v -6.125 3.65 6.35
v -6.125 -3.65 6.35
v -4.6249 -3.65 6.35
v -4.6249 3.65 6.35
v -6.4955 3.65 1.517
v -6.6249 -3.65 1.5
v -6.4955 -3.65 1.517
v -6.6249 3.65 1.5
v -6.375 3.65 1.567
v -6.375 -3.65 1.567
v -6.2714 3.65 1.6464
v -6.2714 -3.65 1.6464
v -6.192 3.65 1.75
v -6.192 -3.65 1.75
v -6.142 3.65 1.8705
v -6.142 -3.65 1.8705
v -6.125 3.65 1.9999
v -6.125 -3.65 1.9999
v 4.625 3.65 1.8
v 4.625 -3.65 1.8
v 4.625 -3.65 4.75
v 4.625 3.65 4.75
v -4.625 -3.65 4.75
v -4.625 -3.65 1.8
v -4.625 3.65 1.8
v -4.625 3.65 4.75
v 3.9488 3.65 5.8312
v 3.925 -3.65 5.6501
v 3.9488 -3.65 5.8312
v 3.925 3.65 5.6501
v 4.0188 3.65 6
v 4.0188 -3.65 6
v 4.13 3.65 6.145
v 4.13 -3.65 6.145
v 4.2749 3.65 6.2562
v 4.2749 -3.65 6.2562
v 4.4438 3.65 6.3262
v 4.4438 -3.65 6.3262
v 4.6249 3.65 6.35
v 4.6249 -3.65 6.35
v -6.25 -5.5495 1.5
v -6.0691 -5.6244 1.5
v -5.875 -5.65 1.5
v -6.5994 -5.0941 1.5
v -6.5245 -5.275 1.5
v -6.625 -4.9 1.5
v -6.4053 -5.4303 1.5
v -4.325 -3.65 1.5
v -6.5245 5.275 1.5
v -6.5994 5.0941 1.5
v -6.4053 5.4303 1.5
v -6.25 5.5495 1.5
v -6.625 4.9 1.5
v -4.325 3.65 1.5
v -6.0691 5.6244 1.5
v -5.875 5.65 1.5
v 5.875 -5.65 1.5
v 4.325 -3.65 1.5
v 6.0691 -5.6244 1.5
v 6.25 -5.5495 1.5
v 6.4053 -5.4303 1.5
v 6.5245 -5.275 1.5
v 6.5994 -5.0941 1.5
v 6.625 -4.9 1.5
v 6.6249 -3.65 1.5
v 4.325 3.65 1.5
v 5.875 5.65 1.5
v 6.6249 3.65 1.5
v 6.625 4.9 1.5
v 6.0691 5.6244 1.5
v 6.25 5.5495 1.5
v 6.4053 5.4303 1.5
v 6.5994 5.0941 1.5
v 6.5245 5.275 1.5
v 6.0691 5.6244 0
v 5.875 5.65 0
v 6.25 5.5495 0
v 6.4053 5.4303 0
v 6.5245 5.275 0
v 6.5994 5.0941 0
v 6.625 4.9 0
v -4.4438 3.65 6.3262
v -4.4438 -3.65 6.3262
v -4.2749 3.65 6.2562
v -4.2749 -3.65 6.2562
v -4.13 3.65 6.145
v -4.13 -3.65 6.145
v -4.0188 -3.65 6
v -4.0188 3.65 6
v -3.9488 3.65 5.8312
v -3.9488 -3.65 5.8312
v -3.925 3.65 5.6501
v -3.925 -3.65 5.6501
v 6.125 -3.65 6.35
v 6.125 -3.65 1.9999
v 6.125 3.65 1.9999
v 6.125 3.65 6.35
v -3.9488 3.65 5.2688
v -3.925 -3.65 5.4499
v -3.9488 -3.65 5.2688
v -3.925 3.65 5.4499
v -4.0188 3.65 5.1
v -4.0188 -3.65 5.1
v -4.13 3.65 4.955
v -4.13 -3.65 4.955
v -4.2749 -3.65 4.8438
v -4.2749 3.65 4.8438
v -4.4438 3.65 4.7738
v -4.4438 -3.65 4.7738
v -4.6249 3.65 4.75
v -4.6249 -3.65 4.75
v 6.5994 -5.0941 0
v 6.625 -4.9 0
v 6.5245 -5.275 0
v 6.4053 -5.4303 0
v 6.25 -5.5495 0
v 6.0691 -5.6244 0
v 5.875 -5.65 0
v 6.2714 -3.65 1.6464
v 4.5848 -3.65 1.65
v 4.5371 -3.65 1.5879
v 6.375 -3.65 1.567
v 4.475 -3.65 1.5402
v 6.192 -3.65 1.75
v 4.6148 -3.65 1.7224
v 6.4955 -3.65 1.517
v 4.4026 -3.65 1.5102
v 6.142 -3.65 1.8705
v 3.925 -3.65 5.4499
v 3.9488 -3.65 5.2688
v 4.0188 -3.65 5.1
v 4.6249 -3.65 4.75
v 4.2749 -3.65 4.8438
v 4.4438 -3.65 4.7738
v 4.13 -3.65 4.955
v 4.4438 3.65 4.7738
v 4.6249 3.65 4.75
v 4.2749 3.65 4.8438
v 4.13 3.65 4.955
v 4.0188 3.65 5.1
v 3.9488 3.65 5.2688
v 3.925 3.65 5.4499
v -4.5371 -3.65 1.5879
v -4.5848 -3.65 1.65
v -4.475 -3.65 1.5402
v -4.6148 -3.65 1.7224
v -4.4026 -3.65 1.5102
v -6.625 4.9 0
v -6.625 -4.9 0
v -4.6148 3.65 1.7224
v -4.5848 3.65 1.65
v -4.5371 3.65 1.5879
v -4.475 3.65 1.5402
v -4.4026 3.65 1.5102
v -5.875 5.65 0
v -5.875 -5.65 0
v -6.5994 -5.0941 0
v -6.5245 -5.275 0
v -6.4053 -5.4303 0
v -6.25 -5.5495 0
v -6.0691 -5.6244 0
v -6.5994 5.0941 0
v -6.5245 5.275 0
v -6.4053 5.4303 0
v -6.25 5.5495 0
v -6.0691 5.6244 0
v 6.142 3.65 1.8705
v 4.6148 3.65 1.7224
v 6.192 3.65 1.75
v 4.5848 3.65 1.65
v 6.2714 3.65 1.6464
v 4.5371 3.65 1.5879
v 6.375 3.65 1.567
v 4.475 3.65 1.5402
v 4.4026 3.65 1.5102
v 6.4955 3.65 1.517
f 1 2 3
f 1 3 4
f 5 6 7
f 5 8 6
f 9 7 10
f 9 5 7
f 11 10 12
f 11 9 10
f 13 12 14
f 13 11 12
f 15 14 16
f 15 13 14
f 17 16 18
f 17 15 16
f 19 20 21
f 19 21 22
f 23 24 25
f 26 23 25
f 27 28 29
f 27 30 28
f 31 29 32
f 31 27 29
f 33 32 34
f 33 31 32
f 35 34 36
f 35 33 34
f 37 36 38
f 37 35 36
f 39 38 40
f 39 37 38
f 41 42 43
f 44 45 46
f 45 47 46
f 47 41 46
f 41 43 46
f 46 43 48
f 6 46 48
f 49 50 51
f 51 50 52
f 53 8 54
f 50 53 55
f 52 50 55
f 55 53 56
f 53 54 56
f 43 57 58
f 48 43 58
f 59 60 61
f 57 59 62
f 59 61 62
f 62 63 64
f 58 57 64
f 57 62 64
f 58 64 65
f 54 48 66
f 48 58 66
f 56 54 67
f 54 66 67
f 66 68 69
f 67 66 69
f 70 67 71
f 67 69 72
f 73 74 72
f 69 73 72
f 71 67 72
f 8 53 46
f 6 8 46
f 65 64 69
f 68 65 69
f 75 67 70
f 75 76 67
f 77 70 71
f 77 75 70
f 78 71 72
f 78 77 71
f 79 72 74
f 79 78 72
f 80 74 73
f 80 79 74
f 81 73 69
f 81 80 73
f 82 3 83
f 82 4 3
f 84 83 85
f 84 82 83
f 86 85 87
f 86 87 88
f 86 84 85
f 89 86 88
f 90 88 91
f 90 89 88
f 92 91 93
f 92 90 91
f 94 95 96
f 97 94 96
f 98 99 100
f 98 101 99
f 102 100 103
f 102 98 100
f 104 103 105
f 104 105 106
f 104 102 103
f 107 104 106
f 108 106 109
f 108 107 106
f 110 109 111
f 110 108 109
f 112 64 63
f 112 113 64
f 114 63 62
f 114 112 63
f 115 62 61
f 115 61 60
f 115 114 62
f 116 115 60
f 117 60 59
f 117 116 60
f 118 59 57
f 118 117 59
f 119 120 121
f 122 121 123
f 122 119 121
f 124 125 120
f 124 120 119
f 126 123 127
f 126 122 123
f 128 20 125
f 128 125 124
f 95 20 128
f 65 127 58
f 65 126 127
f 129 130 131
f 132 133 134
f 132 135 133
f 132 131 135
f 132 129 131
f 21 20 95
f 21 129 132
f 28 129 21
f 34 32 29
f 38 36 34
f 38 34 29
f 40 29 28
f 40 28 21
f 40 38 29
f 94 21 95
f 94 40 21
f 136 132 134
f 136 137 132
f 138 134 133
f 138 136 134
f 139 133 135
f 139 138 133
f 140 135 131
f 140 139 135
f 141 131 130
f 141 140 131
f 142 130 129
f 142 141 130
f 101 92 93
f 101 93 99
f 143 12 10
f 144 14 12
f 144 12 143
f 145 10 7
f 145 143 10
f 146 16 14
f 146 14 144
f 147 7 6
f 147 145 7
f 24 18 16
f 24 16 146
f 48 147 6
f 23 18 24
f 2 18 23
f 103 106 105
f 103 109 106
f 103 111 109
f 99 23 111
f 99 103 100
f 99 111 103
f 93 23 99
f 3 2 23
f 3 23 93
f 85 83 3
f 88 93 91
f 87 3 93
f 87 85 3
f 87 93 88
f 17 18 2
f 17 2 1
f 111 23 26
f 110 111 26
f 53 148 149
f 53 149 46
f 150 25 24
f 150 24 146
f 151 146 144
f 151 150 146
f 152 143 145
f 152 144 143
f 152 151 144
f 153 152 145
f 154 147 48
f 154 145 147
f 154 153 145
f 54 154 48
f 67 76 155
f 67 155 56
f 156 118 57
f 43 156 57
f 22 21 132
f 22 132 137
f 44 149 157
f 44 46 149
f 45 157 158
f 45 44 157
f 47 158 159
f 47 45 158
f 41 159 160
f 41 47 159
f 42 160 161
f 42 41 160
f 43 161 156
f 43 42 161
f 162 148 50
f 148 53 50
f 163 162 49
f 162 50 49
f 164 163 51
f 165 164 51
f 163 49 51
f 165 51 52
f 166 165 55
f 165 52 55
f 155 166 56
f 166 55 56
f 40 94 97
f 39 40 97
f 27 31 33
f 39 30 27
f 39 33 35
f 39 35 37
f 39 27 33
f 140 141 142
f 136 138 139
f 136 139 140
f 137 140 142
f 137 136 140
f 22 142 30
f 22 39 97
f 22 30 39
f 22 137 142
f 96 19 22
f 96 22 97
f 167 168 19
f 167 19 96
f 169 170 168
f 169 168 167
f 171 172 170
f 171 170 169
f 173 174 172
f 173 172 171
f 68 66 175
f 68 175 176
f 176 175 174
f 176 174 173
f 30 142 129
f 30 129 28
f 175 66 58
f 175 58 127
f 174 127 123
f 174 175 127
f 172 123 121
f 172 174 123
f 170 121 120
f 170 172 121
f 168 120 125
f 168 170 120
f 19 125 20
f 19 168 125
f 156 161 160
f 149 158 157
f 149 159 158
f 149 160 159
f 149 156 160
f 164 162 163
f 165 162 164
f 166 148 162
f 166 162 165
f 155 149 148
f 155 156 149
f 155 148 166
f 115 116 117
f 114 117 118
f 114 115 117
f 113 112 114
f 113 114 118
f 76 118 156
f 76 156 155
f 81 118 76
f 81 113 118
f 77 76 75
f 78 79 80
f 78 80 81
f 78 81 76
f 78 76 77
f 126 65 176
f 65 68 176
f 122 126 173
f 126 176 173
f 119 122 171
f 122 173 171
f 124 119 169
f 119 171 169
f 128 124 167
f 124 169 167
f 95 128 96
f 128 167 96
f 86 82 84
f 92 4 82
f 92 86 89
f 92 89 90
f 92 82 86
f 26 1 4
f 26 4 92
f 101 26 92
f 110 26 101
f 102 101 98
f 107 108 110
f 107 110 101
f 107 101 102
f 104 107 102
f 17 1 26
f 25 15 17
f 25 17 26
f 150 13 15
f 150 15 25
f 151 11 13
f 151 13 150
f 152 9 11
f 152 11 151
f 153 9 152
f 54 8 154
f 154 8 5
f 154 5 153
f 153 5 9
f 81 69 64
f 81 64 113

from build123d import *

# Parameters (mm, degrees)
SKETCH_1_W          = 12.25
SKETCH_1_H          = 11.3
EXTRUDE_1_DEPTH     = 2.5
SKETCH_2_W          = 1.5
SKETCH_2_H          = 11.3
EXTRUDE_2_DEPTH     = 3.85
SKETCH_5_W          = 9.25
SKETCH_5_H          = 11.5
CUT_EXTRUDE_1_DEPTH = 1
SKETCH_8_W          = 1.6
SKETCH_8_H          = 11.3
EXTRUDE_5_DEPTH     = 0.7
SKETCH_9_W          = 1.6
SKETCH_9_H          = 11.3
EXTRUDE_6_DEPTH     = 0.7
FILLET_8_R          = 0.3
SKETCH_11_W         = 12.25
SKETCH_11_H         = 4.85
CUT_EXTRUDE_2_DEPTH = 2
SKETCH_12_W         = 12.25
SKETCH_12_H         = 4.85
CUT_EXTRUDE_3_DEPTH = 2
SKETCH_13_W         = 1.5
SKETCH_13_H         = 11.3
EXTRUDE_7_DEPTH     = 0.5
SKETCH_14_W         = 1.5
SKETCH_14_H         = 11.3
EXTRUDE_8_DEPTH     = 0.5
FILLET_9_R          = 0.5
FILLET_10_R         = 0.7
FILLET_11_R         = 0.75


with BuildPart() as part:
    # 스케치1 → 보스-돌출1 (new body)
    with BuildSketch(Plane.XY):
        Rectangle(SKETCH_1_W, SKETCH_1_H)
    extrude(amount=EXTRUDE_1_DEPTH)

    # 스케치2 → 보스-돌출2 (add)
    with BuildSketch(Plane.XY.offset(2.5)):
        with Locations((-5.375, 0)):
            Rectangle(SKETCH_2_W, SKETCH_2_H)
        with Locations((5.375, 0)):
            Rectangle(SKETCH_2_W, SKETCH_2_H)
    extrude(amount=EXTRUDE_2_DEPTH)

    # 스케치5 → 컷-돌출1 (cut)
    with BuildSketch(Plane.XY.offset(2.5)):
        Rectangle(SKETCH_5_W, SKETCH_5_H)
    extrude(amount=-CUT_EXTRUDE_1_DEPTH, mode=Mode.SUBTRACT)

    # 스케치8 → 보스-돌출5 (add)
    with BuildSketch(Plane(origin=(-4.625, 0, 0), x_dir=(0, 0, -1), z_dir=(1, 0, 0))):
        with Locations((-5.55, 0)):
            Rectangle(SKETCH_8_W, SKETCH_8_H)
    extrude(amount=EXTRUDE_5_DEPTH)

    # 스케치9 → 보스-돌출6 (add)
    with BuildSketch(Plane.ZY.offset(-4.625)):
        with Locations((5.55, 0)):
            Rectangle(SKETCH_9_W, SKETCH_9_H)
    extrude(amount=EXTRUDE_6_DEPTH)

    # 필렛8
    fillet_8_edges = [part.edges().sort_by_distance(p)[0] for p in [
        (4.625, 0, 1.5),
        (-4.625, 0, 1.5),
    ]]
    fillet(fillet_8_edges, radius=FILLET_8_R)

    # 스케치11 → 컷-돌출2 (cut)
    with BuildSketch(Plane(origin=(0, 5.65, 0), x_dir=(1, 0, 0), z_dir=(0, 1, 0))):
        with Locations((0, -3.925)):
            Rectangle(SKETCH_11_W, SKETCH_11_H)
    extrude(amount=-CUT_EXTRUDE_2_DEPTH, mode=Mode.SUBTRACT)

    # 스케치12 → 컷-돌출3 (cut)
    with BuildSketch(Plane.XZ.offset(5.65)):
        with Locations((0, 3.925)):
            Rectangle(SKETCH_12_W, SKETCH_12_H)
    extrude(amount=-CUT_EXTRUDE_3_DEPTH, mode=Mode.SUBTRACT)

    # 스케치13 → 보스-돌출7 (add)
    with BuildSketch(Plane(origin=(6.125, 0, 0), x_dir=(0, 0, -1), z_dir=(1, 0, 0))):
        with Locations((-0.75, 0)):
            Rectangle(SKETCH_13_W, SKETCH_13_H)
    extrude(amount=EXTRUDE_7_DEPTH)

    # 스케치14 → 보스-돌출8 (add)
    with BuildSketch(Plane.ZY.offset(6.125)):
        with Locations((0.75, 0)):
            Rectangle(SKETCH_14_W, SKETCH_14_H)
    extrude(amount=EXTRUDE_8_DEPTH)

    # 필렛9
    fillet_9_edges = [part.edges().sort_by_distance(p)[0] for p in [
        (6.125, 0, 1.5),
        (-6.125, 0, 1.5),
    ]]
    fillet(fillet_9_edges, radius=FILLET_9_R - 0.0001)  # a hair under: the kernel refuses the full size

    # 필렛10
    fillet_10_edges = [part.edges().sort_by_distance(p)[0] for p in [
        (-3.925, 0, 6.35),
        (-3.925, 0, 4.75),
        (3.925, 0, 4.75),
        (3.925, 0, 6.35),
    ]]
    fillet(fillet_10_edges, radius=FILLET_10_R - 0.0001)  # a hair under: the kernel refuses the full size

    # 필렛11
    fillet_11_edges = [part.edges().sort_by_distance(p)[0] for p in [
        (6.625, -5.65, 0.75),
        (6.625, 5.65, 0.75),
        (-6.625, 5.65, 0.75),
        (-6.625, -5.65, 0.75),
    ]]
    fillet(fillet_11_edges, radius=FILLET_11_R)


solid = part.part
